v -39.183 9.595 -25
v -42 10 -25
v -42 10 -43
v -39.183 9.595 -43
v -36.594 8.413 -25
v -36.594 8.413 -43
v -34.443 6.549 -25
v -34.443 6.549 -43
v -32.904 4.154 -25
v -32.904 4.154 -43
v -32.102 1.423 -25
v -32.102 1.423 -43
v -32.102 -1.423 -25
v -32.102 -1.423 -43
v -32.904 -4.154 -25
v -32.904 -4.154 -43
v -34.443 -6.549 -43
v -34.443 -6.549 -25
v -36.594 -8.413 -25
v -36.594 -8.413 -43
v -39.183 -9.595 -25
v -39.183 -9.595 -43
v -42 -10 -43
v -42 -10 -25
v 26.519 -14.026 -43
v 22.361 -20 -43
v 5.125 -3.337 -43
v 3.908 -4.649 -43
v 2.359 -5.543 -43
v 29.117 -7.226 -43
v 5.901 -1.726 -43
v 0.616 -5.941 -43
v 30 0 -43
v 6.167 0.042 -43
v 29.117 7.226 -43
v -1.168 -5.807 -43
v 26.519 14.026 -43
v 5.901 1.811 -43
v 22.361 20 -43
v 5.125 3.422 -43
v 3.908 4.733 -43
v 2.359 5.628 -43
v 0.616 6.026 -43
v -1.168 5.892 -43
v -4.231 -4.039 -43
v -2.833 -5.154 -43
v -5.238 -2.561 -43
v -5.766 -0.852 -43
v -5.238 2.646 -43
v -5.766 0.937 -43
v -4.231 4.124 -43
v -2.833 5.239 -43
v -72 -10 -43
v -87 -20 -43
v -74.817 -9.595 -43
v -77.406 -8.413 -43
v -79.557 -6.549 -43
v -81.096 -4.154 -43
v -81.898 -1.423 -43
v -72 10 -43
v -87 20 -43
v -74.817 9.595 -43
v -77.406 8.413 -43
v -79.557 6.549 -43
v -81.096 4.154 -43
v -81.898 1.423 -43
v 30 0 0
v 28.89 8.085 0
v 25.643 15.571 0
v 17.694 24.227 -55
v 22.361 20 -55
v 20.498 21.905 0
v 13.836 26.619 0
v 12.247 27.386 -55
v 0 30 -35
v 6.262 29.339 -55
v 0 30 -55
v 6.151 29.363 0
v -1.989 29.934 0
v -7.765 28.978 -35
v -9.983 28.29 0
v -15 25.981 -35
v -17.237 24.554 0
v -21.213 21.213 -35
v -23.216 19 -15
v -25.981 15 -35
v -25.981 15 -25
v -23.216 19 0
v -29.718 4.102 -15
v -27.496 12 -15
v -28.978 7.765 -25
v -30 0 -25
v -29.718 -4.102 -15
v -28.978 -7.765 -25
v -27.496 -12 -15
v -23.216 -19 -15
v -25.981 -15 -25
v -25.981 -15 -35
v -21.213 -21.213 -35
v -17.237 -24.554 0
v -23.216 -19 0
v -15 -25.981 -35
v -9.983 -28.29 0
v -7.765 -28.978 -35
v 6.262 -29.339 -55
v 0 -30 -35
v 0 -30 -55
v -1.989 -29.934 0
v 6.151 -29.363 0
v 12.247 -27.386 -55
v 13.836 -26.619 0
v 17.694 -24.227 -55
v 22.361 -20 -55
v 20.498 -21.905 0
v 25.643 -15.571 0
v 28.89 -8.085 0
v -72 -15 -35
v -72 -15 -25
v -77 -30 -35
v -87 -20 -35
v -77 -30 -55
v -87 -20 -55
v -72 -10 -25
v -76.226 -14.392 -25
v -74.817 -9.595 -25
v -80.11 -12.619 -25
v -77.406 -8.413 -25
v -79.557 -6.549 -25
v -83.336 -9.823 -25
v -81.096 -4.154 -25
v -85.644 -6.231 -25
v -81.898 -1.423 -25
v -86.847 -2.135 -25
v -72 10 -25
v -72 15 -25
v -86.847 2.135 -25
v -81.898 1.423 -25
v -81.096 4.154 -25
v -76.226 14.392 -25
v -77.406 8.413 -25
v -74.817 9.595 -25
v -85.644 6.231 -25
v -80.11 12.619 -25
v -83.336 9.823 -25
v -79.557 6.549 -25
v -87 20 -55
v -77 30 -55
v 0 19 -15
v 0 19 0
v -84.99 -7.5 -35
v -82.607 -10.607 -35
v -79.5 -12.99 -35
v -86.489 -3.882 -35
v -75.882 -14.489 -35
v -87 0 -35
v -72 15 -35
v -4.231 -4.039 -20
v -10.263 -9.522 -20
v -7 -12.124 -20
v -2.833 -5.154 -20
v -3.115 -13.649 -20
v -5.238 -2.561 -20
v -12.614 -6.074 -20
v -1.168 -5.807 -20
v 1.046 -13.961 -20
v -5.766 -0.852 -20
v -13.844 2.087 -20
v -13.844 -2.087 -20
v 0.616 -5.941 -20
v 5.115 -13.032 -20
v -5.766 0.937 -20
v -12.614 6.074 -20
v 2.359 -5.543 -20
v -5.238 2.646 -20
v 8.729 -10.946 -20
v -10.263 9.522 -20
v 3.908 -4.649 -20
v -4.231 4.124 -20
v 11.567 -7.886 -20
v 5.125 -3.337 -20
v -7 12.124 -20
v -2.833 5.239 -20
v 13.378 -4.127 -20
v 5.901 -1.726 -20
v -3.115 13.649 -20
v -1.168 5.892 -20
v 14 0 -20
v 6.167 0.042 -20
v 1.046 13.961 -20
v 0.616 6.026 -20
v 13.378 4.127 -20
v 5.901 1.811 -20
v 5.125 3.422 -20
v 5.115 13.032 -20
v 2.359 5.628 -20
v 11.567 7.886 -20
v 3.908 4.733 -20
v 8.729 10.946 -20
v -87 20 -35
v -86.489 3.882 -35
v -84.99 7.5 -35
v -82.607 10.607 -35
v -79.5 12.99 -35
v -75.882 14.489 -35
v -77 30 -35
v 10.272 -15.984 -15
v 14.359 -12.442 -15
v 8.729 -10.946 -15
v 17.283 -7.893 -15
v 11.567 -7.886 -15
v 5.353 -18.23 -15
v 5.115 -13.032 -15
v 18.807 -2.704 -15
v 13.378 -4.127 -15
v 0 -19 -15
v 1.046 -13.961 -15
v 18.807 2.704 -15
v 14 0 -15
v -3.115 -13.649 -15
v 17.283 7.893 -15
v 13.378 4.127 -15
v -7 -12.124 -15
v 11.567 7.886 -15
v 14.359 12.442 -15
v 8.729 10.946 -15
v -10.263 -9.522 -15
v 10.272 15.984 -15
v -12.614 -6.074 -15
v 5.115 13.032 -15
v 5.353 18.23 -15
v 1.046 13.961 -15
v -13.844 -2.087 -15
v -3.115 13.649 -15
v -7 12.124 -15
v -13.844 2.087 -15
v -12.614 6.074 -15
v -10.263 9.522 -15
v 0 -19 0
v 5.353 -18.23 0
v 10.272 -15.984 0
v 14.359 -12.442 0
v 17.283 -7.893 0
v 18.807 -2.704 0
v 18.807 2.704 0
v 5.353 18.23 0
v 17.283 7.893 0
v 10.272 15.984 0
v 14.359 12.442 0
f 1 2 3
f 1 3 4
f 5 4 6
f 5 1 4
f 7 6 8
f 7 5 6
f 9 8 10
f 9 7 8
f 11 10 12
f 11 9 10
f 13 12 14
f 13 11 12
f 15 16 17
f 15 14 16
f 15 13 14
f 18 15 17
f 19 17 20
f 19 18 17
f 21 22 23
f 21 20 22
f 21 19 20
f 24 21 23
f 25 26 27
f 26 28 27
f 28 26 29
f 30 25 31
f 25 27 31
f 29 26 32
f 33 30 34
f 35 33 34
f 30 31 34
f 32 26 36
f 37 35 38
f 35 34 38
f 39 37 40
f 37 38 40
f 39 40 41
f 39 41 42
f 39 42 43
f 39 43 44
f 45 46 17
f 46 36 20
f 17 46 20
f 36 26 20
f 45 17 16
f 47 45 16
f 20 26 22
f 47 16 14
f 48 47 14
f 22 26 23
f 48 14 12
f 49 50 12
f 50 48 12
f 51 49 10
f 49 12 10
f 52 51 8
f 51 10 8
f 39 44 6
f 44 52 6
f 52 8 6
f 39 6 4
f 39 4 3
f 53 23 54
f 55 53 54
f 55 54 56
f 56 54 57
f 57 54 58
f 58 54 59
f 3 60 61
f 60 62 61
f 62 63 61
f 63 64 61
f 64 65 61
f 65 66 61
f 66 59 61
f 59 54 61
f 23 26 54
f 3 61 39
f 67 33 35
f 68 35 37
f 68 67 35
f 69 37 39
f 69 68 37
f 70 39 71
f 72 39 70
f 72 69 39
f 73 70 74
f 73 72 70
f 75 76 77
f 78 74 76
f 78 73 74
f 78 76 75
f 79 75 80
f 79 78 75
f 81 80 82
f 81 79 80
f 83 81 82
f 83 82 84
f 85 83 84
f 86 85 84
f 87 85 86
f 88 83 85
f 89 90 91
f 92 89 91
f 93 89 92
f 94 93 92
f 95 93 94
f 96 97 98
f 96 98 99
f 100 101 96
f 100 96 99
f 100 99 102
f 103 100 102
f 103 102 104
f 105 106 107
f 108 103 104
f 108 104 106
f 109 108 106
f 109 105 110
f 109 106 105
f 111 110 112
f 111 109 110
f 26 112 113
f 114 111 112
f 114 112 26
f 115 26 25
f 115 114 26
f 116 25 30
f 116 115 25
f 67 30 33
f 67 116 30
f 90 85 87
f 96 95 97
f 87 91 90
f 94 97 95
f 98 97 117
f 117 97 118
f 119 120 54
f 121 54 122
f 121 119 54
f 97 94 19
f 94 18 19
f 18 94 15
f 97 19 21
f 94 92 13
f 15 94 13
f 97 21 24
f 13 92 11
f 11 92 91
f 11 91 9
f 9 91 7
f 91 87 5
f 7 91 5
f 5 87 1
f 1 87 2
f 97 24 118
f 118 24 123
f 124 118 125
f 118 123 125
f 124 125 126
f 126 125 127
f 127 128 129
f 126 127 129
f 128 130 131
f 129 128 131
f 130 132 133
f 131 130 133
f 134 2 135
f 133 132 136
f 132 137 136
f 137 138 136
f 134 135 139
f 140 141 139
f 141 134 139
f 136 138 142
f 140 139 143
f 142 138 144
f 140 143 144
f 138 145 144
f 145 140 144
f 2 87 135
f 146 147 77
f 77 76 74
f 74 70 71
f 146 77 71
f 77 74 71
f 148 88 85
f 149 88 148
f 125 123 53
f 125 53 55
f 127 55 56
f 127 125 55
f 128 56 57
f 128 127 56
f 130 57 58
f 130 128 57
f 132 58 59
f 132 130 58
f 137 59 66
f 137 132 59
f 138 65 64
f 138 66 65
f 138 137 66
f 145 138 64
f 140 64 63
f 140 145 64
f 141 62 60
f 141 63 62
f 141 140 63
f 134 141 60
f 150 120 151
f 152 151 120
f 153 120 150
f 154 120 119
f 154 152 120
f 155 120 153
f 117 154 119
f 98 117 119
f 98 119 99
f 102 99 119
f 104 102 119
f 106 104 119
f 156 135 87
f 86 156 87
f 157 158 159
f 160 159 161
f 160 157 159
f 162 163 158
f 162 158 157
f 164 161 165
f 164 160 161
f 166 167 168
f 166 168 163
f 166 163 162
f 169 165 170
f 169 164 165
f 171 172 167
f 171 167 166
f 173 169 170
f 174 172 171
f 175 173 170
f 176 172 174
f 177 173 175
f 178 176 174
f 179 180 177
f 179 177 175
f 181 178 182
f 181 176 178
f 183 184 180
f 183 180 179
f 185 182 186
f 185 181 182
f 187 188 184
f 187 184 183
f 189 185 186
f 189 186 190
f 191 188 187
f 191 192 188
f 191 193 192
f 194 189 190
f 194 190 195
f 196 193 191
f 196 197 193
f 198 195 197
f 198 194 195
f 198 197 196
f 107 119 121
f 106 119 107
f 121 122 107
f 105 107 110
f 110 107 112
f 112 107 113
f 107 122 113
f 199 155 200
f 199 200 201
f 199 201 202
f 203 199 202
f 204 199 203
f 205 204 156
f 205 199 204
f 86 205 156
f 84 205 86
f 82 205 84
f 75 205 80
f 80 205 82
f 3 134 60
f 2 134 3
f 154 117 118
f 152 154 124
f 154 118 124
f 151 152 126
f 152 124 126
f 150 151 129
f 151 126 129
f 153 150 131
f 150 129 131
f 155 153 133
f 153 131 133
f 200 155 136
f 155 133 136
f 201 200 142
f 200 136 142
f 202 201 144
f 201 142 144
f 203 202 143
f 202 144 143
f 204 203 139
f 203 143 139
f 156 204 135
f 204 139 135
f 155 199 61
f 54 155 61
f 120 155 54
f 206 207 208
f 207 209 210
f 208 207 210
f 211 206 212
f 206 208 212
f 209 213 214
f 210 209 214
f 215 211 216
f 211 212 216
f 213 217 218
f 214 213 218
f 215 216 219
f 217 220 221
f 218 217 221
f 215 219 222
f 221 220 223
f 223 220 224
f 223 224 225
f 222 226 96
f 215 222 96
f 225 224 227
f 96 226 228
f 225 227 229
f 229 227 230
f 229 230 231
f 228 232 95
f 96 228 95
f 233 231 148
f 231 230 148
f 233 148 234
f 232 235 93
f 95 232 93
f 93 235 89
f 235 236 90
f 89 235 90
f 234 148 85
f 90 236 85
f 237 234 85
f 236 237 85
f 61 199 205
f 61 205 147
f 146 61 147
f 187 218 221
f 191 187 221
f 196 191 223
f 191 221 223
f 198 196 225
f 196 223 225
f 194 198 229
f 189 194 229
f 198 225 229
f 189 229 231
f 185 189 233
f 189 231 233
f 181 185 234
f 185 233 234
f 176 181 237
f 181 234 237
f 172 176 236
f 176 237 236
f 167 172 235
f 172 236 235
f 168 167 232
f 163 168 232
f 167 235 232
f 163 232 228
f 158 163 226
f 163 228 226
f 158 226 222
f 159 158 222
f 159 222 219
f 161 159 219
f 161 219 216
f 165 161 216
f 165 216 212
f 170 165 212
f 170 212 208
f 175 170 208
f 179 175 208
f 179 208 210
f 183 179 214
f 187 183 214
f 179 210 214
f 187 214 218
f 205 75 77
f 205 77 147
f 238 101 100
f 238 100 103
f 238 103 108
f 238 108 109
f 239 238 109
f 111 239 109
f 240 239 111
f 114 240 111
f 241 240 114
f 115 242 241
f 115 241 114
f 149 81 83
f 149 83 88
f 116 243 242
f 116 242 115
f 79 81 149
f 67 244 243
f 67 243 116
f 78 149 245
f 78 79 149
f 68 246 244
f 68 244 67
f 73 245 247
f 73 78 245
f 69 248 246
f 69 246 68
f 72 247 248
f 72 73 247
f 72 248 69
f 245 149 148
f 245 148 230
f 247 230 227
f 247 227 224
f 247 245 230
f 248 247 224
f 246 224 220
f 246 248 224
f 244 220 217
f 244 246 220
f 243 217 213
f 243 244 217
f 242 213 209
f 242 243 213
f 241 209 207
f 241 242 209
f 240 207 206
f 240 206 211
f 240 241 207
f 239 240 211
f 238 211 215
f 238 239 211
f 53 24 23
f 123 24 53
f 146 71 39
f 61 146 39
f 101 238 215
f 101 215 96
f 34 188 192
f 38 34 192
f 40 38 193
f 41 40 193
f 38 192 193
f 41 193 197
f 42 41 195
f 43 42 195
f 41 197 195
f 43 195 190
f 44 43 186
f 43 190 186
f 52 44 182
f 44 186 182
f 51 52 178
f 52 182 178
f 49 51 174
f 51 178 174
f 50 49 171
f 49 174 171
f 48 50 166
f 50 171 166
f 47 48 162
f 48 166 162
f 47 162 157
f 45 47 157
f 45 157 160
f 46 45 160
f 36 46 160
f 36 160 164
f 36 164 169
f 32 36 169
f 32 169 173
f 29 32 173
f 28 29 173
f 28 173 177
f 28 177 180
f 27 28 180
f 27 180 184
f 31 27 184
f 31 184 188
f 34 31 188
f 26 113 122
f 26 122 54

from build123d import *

# Parameters (mm, degrees)
ESBO_O3_R                = 30
RESSALTO_EXTRUS_O1_DEPTH = 55
RESSALTO_EXTRUS_O2_START = -20
RESSALTO_EXTRUS_O2_DEPTH = 20
CORTE_EXTRUS_O2_DEPTH    = 15
ESBO_O9_R                = 14
CORTE_EXTRUS_O6_DEPTH    = 5
ESBO_O12_R               = 6
CORTE_EXTRUS_O7_DEPTH    = 65
CHANFRO2_SIZE            = 10
CHANFRO3_SIZE            = 10
RESSALTO_EXTRUS_O4_START = 10
RESSALTO_EXTRUS_O4_DEPTH = 10
CORTE_EXTRUS_O8_DEPTH    = 54
ESBO_O16_W               = 12
ESBO_O16_H               = 40
CORTE_EXTRUS_O9_DEPTH    = 124


with BuildPart() as part:
    # Esboço3 → Ressalto-extrusão1 (new body)
    with BuildSketch(Plane.XY):
        Circle(ESBO_O3_R)
    extrude(amount=-RESSALTO_EXTRUS_O1_DEPTH)

    # Esboço4 → Ressalto-extrusão2 (add)
    with BuildSketch(Plane(origin=(0, 0, -55), x_dir=(-1, 0, 0), z_dir=(0, 0, -1)).offset(RESSALTO_EXTRUS_O2_START)):
        with BuildLine():
            Line((0, 30), (87, 30))
            Line((87, 30), (87, -30))
            Line((87, -30), (0, -30))
            ThreePointArc((0, -30), (30, 0), (0, 30))
        make_face()
    extrude(amount=RESSALTO_EXTRUS_O2_DEPTH)

    # Esboço6 → Corte-extrusão2 (cut)
    with BuildSketch(Plane.XY):
        with BuildLine():
            Line((0, -19), (-43.25121435, -19))
            Line((-43.25121435, -19), (-43.25121435, 19))
            Line((-43.25121435, 19), (0, 19))
            ThreePointArc((0, 19), (19, 0), (0, -19))
        make_face()
    extrude(amount=-CORTE_EXTRUS_O2_DEPTH, mode=Mode.SUBTRACT)

    # Esboço9 → Corte-extrusão6 (cut)
    with BuildSketch(Plane.XY.offset(-15)):
        Circle(ESBO_O9_R)
    extrude(amount=-CORTE_EXTRUS_O6_DEPTH, mode=Mode.SUBTRACT)

    # Esboço12 → Corte-extrusão7 (cut)
    with BuildSketch(Plane.XY.offset(-20)):
        with Locations((0.167448048, 0.04248466)):
            Circle(ESBO_O12_R)
    extrude(amount=-CORTE_EXTRUS_O7_DEPTH, mode=Mode.SUBTRACT)

    # Chanfro2
    chanfro2_edges = [part.edges().sort_by_distance(p)[0] for p in [
        (-87, 30, -45),
    ]]
    chamfer(chanfro2_edges, length=CHANFRO2_SIZE)

    # Chanfro3
    chanfro3_edges = [part.edges().sort_by_distance(p)[0] for p in [
        (-87, -30, -45),
    ]]
    chamfer(chanfro3_edges, length=CHANFRO3_SIZE)

    # Esboço14 → Ressalto-extrusão4 (add)
    with BuildSketch(Plane.XY.offset(-35).offset(RESSALTO_EXTRUS_O4_START)):
        with BuildLine():
            Line((-72, 15), (-25.980762114, 15))
            ThreePointArc((-25.980762114, 15), (-30, 0), (-25.980762114, -15))
            Line((-25.980762114, -15), (-72, -15))
            ThreePointArc((-72, -15), (-87, 0), (-72, 15))
        make_face()
    extrude(amount=-RESSALTO_EXTRUS_O4_DEPTH)

    # Esboço15 → Corte-extrusão8 (cut)
    with BuildSketch(Plane.XY.offset(-25)):
        with BuildLine():
            Line((-72, 10), (-42, 10))
            ThreePointArc((-42, 10), (-32, 0), (-42, -10))
            Line((-42, -10), (-72, -10))
            ThreePointArc((-72, -10), (-82, 0), (-72, 10))
        make_face()
    extrude(amount=-CORTE_EXTRUS_O8_DEPTH, mode=Mode.SUBTRACT)

    # Esboço16 → Corte-extrusão9 (cut)
    with BuildSketch(Plane.ZY.offset(87)):
        with Locations((-49, 0)):
            Rectangle(ESBO_O16_W, ESBO_O16_H)
    extrude(amount=-CORTE_EXTRUS_O9_DEPTH, mode=Mode.SUBTRACT)


solid = part.part
